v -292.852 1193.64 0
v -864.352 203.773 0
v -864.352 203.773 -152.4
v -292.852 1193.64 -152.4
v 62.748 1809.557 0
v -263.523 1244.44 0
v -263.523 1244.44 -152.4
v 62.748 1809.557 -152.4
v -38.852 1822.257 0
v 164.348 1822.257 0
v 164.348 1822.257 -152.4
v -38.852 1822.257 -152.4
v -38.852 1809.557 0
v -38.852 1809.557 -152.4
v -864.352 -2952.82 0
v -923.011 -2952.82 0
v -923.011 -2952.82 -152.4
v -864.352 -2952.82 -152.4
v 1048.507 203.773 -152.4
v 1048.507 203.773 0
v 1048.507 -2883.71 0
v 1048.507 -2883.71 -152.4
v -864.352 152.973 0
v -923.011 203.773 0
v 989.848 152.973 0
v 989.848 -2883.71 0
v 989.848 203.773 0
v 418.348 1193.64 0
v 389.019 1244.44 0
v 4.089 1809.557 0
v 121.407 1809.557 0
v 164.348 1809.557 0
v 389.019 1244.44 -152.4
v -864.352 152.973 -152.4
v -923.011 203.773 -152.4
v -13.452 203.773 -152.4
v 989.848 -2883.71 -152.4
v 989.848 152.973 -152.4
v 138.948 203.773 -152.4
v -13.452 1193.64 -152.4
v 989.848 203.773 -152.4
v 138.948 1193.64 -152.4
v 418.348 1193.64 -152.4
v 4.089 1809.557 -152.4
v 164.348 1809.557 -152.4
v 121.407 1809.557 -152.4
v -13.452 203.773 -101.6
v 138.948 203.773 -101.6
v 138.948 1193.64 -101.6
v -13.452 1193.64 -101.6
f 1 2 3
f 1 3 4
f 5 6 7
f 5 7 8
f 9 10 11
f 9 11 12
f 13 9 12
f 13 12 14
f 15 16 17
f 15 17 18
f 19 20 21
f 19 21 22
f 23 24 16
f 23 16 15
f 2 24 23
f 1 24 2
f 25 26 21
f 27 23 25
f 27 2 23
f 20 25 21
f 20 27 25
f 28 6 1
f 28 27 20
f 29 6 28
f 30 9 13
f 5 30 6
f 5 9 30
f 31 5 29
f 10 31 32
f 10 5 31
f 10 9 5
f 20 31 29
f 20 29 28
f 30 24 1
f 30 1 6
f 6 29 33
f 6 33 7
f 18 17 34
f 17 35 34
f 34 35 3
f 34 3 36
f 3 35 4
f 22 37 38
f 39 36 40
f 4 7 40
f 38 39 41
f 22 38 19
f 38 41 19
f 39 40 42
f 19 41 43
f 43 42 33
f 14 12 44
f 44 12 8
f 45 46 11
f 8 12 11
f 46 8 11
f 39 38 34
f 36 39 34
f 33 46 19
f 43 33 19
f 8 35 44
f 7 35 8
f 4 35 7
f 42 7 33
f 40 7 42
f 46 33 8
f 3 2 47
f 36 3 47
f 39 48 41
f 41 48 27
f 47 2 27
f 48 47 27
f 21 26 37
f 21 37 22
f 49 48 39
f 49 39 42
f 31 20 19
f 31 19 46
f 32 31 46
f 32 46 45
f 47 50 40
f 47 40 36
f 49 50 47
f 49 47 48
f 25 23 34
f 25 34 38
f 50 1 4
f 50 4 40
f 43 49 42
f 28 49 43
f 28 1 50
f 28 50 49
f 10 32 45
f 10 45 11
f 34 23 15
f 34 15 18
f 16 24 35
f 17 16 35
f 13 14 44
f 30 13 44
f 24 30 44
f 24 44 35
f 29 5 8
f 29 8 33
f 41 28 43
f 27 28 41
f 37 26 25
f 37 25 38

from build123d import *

# Parameters (mm, degrees)
F0_R     = 53.975
F1_DEPTH = 152.4
F2_W     = 152.4
F2_H     = 989.8670365256
F3_DEPTH = 101.6
F6_DEPTH = 2540
F7_DEPTH = 2540


# Not quite as in the source:
# - the program builds the solid bodies; features that only make, move or delete a surface that nothing else refers to are left out


with BuildPart() as f1:
    # F0 (on Top) → F1 (new body)
    with BuildSketch(Plane.XY):
        Polygon((-864.3519468606, 152.9725746632), (-864.3519468606, 203.7725746632), (-923.0107342102, 203.7725746632), (-923.0107342102, -412.8196537495), (-864.3519468606, -412.8196537495), align=None)
        Polygon((989.8480531394, 203.7725746632), (989.8480531394, 152.9725746632), (989.8480531394, -343.7095284462), (1048.5068404891, -343.7095284462), (1048.5068404891, 203.7725746632), align=None)
        Polygon((121.4068404891, 1809.5568783603), (62.7480531394, 1809.5568783603), (389.0186594646, 1244.4396111888), (418.3480531394, 1193.6396111888), (989.8480531394, 203.7725746632), (1048.5068404891, 203.7725746632), align=None)
        Polygon((-263.5225531857, 1244.4396111888), (-292.8519468606, 1193.6396111888), (-36.2017042935, 1193.6396111888), (-13.4519468606, 1193.6396111888), (116.1982957065, 1193.6396111888), (138.9480531394, 1193.6396111888), (418.3480531394, 1193.6396111888), (389.0186594646, 1244.4396111888), align=None)
        Polygon((-13.4519468606, 203.7725746632), (-864.3519468606, 203.7725746632), (-864.3519468606, 152.9725746632), (989.8480531394, 152.9725746632), (989.8480531394, 203.7725746632), (138.9480531394, 203.7725746632), (62.7480531394, 203.7725746632), align=None)
        Polygon((-13.4519468606, 1193.6396111888), (-13.4519468606, 203.7725746632), (62.7480531394, 203.7725746632), (138.9480531394, 203.7725746632), (138.9480531394, 1193.6396111888), (116.1982957065, 1193.6396111888), align=None)
        with Locations((62.7480531394, 698.6915746632)):
            Circle(F0_R, mode=Mode.SUBTRACT)
        Polygon((-923.0107342102, 203.7725746632), (-864.3519468606, 203.7725746632), (-292.8519468606, 1193.6396111888), (-263.5225531857, 1244.4396111888), (62.7480531394, 1809.5568783603), (4.0892657898, 1809.5568783603), align=None)
        with Locations((62.7480531394, 698.6915746632)):
            Circle(F0_R)
        Polygon((-38.8519468606, 1809.5568783603), (4.0892657898, 1809.5568783603), (62.7480531394, 1809.5568783603), (121.4068404891, 1809.5568783603), (164.3480531394, 1809.5568783603), (164.3480531394, 1822.2568783603), (-38.8519468606, 1822.2568783603), align=None)
    extrude(amount=-F1_DEPTH)

    # F2 (on face) → F3 (cut)
    with BuildSketch(Plane.XY):
        with Locations((62.7480531394, 698.706092926)):
            Rectangle(F2_W, F2_H)
    extrude(amount=-F3_DEPTH, mode=Mode.SUBTRACT)

    # F6 (add): a face of the model
    f6_faces = [f1.faces().sort_by_distance(p)[0] for p in [
        (1019.1774468143, -343.7095284462, -76.2),
    ]]
    extrude(f6_faces, amount=F6_DEPTH)

    # F7 (add): a face of the model
    f7_faces = [f1.faces().sort_by_distance(p)[0] for p in [
        (-893.6813405354, -412.8196537495, -76.2),
    ]]
    extrude(f7_faces, amount=F7_DEPTH)


solid = f1.part
